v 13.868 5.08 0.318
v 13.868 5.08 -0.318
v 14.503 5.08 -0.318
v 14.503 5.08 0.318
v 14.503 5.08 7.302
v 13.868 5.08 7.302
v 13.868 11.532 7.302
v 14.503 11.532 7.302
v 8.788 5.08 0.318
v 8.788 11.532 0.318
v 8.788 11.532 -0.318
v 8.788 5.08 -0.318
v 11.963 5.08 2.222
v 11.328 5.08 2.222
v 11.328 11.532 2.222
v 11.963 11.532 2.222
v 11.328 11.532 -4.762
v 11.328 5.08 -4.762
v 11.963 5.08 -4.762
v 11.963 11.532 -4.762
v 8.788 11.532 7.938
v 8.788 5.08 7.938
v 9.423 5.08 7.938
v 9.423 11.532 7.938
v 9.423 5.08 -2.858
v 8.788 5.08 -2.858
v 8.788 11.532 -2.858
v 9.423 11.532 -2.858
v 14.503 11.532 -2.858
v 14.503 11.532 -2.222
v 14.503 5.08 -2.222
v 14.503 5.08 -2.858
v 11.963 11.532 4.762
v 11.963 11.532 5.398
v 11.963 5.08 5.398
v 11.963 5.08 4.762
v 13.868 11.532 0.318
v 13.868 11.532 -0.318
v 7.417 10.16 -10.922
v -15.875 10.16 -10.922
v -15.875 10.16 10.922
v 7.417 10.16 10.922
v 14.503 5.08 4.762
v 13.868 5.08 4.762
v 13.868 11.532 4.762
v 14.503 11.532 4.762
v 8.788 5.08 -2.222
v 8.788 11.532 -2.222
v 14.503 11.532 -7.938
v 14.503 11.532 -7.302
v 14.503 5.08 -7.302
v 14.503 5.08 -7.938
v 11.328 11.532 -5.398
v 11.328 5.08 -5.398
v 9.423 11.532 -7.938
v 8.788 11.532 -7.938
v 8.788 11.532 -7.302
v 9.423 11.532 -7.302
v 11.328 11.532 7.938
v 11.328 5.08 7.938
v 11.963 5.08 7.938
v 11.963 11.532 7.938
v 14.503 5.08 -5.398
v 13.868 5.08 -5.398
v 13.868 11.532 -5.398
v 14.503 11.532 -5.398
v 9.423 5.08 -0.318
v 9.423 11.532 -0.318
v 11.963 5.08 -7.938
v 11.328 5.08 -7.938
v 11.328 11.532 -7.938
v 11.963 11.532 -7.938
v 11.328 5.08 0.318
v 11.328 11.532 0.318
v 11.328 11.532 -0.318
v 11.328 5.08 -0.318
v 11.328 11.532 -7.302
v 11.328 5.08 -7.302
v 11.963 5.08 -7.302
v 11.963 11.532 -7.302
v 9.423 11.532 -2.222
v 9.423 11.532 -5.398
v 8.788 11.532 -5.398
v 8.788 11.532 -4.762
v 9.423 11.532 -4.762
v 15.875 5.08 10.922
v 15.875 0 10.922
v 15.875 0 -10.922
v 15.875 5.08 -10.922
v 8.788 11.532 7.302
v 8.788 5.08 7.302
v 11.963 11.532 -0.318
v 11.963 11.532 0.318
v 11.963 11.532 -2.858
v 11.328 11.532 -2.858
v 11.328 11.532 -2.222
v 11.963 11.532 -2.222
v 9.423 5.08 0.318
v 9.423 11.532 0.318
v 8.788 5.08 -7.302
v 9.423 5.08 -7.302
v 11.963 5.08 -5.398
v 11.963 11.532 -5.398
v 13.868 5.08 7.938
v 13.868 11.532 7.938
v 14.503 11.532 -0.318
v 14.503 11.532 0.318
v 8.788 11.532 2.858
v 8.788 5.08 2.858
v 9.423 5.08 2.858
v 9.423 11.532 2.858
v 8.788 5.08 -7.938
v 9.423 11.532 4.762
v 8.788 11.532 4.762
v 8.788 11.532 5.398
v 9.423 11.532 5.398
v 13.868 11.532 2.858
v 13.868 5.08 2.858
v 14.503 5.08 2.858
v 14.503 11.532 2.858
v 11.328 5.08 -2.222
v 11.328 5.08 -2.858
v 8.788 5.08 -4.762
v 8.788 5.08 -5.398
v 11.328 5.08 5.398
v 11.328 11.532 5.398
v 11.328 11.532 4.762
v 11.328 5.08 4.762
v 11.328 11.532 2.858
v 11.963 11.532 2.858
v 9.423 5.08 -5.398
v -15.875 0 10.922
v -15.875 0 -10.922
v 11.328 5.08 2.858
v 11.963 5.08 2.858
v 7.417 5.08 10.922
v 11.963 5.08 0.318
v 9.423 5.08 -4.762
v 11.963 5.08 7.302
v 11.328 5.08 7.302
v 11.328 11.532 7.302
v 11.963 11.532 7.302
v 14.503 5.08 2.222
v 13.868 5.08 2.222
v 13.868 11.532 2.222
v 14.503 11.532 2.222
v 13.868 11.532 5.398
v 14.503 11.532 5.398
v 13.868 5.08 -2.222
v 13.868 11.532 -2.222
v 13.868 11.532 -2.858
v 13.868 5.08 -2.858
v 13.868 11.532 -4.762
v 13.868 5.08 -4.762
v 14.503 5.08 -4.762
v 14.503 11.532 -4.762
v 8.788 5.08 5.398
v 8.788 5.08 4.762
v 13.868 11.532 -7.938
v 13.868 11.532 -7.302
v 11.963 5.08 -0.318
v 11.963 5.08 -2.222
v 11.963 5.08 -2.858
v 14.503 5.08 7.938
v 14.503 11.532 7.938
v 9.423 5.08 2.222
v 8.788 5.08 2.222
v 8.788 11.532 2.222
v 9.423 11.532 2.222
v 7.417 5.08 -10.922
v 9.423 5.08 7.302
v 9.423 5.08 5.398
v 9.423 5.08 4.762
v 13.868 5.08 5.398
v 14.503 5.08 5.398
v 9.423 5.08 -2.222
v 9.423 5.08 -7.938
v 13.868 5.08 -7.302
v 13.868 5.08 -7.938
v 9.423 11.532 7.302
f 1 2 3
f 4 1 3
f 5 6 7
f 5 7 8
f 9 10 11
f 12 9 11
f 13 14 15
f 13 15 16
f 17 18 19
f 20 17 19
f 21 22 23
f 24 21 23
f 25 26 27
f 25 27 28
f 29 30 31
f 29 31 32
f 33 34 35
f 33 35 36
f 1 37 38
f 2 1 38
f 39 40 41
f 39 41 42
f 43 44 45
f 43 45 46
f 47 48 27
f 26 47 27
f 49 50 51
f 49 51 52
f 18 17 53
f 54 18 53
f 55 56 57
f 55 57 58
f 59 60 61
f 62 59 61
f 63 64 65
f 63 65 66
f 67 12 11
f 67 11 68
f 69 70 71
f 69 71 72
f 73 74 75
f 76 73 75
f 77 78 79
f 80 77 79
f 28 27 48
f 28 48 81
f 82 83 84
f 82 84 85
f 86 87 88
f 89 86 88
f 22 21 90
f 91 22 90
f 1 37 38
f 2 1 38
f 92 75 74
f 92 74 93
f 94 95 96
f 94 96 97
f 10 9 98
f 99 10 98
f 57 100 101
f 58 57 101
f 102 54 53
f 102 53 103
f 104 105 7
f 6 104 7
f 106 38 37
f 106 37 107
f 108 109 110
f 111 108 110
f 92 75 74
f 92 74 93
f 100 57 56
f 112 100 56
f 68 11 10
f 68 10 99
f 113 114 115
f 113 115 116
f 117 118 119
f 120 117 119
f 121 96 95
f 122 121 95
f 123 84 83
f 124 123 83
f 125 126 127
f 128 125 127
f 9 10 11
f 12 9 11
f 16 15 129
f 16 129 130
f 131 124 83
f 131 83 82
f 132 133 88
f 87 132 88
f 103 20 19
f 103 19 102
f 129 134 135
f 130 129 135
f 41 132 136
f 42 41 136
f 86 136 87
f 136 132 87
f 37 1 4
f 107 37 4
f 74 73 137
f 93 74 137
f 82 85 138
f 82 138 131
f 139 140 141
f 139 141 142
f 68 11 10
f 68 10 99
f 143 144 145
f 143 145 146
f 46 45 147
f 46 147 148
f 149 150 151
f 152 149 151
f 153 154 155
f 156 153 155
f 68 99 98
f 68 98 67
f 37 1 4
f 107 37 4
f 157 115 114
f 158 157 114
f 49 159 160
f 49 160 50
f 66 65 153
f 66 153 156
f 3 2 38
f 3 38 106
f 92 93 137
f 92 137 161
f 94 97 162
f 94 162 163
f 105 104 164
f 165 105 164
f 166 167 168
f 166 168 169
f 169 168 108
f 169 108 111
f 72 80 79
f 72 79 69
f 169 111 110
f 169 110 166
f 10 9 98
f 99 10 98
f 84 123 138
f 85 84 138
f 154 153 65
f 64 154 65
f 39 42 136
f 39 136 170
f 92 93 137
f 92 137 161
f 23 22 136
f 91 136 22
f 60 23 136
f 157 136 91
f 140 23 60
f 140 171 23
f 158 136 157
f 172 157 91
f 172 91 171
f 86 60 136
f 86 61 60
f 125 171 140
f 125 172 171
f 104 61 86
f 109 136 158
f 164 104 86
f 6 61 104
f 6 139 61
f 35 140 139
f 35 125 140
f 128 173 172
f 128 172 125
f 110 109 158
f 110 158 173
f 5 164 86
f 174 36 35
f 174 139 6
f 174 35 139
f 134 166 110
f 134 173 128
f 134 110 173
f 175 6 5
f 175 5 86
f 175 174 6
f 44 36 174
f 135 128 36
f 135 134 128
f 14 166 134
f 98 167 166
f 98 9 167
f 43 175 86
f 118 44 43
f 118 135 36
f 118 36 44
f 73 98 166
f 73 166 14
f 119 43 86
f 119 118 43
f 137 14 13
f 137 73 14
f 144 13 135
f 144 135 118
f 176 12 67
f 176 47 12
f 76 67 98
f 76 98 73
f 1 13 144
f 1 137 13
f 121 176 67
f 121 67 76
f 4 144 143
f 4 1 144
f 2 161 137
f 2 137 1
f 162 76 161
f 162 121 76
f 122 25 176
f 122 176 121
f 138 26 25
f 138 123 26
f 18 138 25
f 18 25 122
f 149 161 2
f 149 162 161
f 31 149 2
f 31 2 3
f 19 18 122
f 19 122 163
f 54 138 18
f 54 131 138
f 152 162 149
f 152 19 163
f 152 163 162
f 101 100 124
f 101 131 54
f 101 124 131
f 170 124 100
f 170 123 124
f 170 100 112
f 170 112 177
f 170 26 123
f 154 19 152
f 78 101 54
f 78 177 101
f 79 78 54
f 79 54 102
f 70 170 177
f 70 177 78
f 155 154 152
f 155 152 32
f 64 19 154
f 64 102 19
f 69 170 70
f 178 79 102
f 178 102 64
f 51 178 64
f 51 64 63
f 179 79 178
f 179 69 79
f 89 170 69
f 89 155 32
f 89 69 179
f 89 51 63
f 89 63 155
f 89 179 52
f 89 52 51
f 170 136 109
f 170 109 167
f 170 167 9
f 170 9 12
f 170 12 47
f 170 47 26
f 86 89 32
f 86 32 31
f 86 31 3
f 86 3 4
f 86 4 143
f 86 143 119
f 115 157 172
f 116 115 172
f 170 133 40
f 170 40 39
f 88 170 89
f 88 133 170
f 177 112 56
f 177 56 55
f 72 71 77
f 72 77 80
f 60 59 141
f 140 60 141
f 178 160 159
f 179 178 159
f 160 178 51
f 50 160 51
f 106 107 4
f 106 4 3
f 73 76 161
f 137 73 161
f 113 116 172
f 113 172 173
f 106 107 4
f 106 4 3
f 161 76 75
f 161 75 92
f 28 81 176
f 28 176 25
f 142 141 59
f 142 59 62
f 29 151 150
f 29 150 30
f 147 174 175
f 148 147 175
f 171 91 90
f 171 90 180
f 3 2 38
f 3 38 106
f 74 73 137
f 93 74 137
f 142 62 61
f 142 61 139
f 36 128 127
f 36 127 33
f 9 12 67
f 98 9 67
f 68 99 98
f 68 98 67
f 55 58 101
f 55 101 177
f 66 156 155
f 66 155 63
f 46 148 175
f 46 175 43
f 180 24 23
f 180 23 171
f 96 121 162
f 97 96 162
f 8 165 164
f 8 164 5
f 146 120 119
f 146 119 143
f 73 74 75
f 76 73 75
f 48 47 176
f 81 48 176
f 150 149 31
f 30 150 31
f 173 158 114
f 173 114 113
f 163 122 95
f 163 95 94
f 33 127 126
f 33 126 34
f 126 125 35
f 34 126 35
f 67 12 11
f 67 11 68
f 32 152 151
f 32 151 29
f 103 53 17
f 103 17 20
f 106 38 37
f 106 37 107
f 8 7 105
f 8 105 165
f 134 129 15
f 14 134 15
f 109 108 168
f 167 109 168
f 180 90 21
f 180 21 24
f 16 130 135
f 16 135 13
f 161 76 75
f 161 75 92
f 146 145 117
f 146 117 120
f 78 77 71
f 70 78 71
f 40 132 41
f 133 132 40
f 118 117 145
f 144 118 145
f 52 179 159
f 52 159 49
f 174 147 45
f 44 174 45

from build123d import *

# Parameters (mm, degrees)
SKETCH1_W            = 31.75
SKETCH1_H            = 21.844
BOSS_EXTRUDE1_DEPTH  = 10.16
SKETCH2_W            = 8.4582
SKETCH2_H            = 21.844
CUT_EXTRUDE1_DEPTH   = 5.08
SKETCH3_W            = 0.635
SKETCH3_H            = 0.635
PINS_DEPTH           = 6.4516
PINS_2_DEPTH         = 6.4516
PINS_3_DEPTH         = 6.4516
LPATTERN1_COUNT      = 4
LPATTERN1_PITCH      = 2.54
LPATTERN1_COUNT_DIR2 = 4
LPATTERN1_PITCH_DIR2 = 2.54


with BuildPart() as part:
    # Sketch1 → Boss-Extrude1 (new body)
    with BuildSketch(Plane(origin=(0, 0, 0), x_dir=(1, 0, 0), z_dir=(0, 1, 0))):
        Rectangle(SKETCH1_W, SKETCH1_H)
    extrude(amount=BOSS_EXTRUDE1_DEPTH)

    # Sketch2 → Cut-Extrude1 (cut)
    with BuildSketch(Plane(origin=(0, 10.16, 0), x_dir=(1, 0, 0), z_dir=(0, 1, 0))):
        with Locations((11.6459, 0)):
            Rectangle(SKETCH2_W, SKETCH2_H)
    extrude(amount=-CUT_EXTRUDE1_DEPTH, mode=Mode.SUBTRACT)


with BuildPart() as body_2:
    # Sketch3 → Pins (new body)
    with BuildSketch(Plane(origin=(0, 5.08, 0), x_dir=(1, 0, 0), z_dir=(0, 1, 0))):
        with Locations((14.1859, 0)):
            Rectangle(SKETCH3_W, SKETCH3_H)
    pins = extrude(amount=PINS_DEPTH)


with BuildPart() as body_3:
    # Sketch3 → Pins 2 (new body)
    with BuildSketch(Plane(origin=(0, 5.08, 0), x_dir=(1, 0, 0), z_dir=(0, 1, 0))):
        with Locations((11.6459, 0)):
            Rectangle(SKETCH3_W, SKETCH3_H)
    pins_2 = extrude(amount=PINS_2_DEPTH)


with BuildPart() as body_4:
    # Sketch3 → Pins 3 (new body)
    with BuildSketch(Plane(origin=(0, 5.08, 0), x_dir=(1, 0, 0), z_dir=(0, 1, 0))):
        with Locations((9.1059, 0)):
            Rectangle(SKETCH3_W, SKETCH3_H)
    pins_3 = extrude(amount=PINS_3_DEPTH)


with BuildPart() as part_1:
    add(part.part)

    # LPattern1: Pins, Pins 2, Pins 3 4 × 4
    with Locations(*[Vector(0, 0, -1) * (i * LPATTERN1_PITCH) + Vector(0, 0, 1) * (j * LPATTERN1_PITCH_DIR2) for i in range(LPATTERN1_COUNT) for j in range(LPATTERN1_COUNT_DIR2) if (i, j) != (0, 0)]):
        add(pins)
        add(pins_2)
        add(pins_3)


solid = Compound([body_2.part, body_3.part, body_4.part, part_1.part])
